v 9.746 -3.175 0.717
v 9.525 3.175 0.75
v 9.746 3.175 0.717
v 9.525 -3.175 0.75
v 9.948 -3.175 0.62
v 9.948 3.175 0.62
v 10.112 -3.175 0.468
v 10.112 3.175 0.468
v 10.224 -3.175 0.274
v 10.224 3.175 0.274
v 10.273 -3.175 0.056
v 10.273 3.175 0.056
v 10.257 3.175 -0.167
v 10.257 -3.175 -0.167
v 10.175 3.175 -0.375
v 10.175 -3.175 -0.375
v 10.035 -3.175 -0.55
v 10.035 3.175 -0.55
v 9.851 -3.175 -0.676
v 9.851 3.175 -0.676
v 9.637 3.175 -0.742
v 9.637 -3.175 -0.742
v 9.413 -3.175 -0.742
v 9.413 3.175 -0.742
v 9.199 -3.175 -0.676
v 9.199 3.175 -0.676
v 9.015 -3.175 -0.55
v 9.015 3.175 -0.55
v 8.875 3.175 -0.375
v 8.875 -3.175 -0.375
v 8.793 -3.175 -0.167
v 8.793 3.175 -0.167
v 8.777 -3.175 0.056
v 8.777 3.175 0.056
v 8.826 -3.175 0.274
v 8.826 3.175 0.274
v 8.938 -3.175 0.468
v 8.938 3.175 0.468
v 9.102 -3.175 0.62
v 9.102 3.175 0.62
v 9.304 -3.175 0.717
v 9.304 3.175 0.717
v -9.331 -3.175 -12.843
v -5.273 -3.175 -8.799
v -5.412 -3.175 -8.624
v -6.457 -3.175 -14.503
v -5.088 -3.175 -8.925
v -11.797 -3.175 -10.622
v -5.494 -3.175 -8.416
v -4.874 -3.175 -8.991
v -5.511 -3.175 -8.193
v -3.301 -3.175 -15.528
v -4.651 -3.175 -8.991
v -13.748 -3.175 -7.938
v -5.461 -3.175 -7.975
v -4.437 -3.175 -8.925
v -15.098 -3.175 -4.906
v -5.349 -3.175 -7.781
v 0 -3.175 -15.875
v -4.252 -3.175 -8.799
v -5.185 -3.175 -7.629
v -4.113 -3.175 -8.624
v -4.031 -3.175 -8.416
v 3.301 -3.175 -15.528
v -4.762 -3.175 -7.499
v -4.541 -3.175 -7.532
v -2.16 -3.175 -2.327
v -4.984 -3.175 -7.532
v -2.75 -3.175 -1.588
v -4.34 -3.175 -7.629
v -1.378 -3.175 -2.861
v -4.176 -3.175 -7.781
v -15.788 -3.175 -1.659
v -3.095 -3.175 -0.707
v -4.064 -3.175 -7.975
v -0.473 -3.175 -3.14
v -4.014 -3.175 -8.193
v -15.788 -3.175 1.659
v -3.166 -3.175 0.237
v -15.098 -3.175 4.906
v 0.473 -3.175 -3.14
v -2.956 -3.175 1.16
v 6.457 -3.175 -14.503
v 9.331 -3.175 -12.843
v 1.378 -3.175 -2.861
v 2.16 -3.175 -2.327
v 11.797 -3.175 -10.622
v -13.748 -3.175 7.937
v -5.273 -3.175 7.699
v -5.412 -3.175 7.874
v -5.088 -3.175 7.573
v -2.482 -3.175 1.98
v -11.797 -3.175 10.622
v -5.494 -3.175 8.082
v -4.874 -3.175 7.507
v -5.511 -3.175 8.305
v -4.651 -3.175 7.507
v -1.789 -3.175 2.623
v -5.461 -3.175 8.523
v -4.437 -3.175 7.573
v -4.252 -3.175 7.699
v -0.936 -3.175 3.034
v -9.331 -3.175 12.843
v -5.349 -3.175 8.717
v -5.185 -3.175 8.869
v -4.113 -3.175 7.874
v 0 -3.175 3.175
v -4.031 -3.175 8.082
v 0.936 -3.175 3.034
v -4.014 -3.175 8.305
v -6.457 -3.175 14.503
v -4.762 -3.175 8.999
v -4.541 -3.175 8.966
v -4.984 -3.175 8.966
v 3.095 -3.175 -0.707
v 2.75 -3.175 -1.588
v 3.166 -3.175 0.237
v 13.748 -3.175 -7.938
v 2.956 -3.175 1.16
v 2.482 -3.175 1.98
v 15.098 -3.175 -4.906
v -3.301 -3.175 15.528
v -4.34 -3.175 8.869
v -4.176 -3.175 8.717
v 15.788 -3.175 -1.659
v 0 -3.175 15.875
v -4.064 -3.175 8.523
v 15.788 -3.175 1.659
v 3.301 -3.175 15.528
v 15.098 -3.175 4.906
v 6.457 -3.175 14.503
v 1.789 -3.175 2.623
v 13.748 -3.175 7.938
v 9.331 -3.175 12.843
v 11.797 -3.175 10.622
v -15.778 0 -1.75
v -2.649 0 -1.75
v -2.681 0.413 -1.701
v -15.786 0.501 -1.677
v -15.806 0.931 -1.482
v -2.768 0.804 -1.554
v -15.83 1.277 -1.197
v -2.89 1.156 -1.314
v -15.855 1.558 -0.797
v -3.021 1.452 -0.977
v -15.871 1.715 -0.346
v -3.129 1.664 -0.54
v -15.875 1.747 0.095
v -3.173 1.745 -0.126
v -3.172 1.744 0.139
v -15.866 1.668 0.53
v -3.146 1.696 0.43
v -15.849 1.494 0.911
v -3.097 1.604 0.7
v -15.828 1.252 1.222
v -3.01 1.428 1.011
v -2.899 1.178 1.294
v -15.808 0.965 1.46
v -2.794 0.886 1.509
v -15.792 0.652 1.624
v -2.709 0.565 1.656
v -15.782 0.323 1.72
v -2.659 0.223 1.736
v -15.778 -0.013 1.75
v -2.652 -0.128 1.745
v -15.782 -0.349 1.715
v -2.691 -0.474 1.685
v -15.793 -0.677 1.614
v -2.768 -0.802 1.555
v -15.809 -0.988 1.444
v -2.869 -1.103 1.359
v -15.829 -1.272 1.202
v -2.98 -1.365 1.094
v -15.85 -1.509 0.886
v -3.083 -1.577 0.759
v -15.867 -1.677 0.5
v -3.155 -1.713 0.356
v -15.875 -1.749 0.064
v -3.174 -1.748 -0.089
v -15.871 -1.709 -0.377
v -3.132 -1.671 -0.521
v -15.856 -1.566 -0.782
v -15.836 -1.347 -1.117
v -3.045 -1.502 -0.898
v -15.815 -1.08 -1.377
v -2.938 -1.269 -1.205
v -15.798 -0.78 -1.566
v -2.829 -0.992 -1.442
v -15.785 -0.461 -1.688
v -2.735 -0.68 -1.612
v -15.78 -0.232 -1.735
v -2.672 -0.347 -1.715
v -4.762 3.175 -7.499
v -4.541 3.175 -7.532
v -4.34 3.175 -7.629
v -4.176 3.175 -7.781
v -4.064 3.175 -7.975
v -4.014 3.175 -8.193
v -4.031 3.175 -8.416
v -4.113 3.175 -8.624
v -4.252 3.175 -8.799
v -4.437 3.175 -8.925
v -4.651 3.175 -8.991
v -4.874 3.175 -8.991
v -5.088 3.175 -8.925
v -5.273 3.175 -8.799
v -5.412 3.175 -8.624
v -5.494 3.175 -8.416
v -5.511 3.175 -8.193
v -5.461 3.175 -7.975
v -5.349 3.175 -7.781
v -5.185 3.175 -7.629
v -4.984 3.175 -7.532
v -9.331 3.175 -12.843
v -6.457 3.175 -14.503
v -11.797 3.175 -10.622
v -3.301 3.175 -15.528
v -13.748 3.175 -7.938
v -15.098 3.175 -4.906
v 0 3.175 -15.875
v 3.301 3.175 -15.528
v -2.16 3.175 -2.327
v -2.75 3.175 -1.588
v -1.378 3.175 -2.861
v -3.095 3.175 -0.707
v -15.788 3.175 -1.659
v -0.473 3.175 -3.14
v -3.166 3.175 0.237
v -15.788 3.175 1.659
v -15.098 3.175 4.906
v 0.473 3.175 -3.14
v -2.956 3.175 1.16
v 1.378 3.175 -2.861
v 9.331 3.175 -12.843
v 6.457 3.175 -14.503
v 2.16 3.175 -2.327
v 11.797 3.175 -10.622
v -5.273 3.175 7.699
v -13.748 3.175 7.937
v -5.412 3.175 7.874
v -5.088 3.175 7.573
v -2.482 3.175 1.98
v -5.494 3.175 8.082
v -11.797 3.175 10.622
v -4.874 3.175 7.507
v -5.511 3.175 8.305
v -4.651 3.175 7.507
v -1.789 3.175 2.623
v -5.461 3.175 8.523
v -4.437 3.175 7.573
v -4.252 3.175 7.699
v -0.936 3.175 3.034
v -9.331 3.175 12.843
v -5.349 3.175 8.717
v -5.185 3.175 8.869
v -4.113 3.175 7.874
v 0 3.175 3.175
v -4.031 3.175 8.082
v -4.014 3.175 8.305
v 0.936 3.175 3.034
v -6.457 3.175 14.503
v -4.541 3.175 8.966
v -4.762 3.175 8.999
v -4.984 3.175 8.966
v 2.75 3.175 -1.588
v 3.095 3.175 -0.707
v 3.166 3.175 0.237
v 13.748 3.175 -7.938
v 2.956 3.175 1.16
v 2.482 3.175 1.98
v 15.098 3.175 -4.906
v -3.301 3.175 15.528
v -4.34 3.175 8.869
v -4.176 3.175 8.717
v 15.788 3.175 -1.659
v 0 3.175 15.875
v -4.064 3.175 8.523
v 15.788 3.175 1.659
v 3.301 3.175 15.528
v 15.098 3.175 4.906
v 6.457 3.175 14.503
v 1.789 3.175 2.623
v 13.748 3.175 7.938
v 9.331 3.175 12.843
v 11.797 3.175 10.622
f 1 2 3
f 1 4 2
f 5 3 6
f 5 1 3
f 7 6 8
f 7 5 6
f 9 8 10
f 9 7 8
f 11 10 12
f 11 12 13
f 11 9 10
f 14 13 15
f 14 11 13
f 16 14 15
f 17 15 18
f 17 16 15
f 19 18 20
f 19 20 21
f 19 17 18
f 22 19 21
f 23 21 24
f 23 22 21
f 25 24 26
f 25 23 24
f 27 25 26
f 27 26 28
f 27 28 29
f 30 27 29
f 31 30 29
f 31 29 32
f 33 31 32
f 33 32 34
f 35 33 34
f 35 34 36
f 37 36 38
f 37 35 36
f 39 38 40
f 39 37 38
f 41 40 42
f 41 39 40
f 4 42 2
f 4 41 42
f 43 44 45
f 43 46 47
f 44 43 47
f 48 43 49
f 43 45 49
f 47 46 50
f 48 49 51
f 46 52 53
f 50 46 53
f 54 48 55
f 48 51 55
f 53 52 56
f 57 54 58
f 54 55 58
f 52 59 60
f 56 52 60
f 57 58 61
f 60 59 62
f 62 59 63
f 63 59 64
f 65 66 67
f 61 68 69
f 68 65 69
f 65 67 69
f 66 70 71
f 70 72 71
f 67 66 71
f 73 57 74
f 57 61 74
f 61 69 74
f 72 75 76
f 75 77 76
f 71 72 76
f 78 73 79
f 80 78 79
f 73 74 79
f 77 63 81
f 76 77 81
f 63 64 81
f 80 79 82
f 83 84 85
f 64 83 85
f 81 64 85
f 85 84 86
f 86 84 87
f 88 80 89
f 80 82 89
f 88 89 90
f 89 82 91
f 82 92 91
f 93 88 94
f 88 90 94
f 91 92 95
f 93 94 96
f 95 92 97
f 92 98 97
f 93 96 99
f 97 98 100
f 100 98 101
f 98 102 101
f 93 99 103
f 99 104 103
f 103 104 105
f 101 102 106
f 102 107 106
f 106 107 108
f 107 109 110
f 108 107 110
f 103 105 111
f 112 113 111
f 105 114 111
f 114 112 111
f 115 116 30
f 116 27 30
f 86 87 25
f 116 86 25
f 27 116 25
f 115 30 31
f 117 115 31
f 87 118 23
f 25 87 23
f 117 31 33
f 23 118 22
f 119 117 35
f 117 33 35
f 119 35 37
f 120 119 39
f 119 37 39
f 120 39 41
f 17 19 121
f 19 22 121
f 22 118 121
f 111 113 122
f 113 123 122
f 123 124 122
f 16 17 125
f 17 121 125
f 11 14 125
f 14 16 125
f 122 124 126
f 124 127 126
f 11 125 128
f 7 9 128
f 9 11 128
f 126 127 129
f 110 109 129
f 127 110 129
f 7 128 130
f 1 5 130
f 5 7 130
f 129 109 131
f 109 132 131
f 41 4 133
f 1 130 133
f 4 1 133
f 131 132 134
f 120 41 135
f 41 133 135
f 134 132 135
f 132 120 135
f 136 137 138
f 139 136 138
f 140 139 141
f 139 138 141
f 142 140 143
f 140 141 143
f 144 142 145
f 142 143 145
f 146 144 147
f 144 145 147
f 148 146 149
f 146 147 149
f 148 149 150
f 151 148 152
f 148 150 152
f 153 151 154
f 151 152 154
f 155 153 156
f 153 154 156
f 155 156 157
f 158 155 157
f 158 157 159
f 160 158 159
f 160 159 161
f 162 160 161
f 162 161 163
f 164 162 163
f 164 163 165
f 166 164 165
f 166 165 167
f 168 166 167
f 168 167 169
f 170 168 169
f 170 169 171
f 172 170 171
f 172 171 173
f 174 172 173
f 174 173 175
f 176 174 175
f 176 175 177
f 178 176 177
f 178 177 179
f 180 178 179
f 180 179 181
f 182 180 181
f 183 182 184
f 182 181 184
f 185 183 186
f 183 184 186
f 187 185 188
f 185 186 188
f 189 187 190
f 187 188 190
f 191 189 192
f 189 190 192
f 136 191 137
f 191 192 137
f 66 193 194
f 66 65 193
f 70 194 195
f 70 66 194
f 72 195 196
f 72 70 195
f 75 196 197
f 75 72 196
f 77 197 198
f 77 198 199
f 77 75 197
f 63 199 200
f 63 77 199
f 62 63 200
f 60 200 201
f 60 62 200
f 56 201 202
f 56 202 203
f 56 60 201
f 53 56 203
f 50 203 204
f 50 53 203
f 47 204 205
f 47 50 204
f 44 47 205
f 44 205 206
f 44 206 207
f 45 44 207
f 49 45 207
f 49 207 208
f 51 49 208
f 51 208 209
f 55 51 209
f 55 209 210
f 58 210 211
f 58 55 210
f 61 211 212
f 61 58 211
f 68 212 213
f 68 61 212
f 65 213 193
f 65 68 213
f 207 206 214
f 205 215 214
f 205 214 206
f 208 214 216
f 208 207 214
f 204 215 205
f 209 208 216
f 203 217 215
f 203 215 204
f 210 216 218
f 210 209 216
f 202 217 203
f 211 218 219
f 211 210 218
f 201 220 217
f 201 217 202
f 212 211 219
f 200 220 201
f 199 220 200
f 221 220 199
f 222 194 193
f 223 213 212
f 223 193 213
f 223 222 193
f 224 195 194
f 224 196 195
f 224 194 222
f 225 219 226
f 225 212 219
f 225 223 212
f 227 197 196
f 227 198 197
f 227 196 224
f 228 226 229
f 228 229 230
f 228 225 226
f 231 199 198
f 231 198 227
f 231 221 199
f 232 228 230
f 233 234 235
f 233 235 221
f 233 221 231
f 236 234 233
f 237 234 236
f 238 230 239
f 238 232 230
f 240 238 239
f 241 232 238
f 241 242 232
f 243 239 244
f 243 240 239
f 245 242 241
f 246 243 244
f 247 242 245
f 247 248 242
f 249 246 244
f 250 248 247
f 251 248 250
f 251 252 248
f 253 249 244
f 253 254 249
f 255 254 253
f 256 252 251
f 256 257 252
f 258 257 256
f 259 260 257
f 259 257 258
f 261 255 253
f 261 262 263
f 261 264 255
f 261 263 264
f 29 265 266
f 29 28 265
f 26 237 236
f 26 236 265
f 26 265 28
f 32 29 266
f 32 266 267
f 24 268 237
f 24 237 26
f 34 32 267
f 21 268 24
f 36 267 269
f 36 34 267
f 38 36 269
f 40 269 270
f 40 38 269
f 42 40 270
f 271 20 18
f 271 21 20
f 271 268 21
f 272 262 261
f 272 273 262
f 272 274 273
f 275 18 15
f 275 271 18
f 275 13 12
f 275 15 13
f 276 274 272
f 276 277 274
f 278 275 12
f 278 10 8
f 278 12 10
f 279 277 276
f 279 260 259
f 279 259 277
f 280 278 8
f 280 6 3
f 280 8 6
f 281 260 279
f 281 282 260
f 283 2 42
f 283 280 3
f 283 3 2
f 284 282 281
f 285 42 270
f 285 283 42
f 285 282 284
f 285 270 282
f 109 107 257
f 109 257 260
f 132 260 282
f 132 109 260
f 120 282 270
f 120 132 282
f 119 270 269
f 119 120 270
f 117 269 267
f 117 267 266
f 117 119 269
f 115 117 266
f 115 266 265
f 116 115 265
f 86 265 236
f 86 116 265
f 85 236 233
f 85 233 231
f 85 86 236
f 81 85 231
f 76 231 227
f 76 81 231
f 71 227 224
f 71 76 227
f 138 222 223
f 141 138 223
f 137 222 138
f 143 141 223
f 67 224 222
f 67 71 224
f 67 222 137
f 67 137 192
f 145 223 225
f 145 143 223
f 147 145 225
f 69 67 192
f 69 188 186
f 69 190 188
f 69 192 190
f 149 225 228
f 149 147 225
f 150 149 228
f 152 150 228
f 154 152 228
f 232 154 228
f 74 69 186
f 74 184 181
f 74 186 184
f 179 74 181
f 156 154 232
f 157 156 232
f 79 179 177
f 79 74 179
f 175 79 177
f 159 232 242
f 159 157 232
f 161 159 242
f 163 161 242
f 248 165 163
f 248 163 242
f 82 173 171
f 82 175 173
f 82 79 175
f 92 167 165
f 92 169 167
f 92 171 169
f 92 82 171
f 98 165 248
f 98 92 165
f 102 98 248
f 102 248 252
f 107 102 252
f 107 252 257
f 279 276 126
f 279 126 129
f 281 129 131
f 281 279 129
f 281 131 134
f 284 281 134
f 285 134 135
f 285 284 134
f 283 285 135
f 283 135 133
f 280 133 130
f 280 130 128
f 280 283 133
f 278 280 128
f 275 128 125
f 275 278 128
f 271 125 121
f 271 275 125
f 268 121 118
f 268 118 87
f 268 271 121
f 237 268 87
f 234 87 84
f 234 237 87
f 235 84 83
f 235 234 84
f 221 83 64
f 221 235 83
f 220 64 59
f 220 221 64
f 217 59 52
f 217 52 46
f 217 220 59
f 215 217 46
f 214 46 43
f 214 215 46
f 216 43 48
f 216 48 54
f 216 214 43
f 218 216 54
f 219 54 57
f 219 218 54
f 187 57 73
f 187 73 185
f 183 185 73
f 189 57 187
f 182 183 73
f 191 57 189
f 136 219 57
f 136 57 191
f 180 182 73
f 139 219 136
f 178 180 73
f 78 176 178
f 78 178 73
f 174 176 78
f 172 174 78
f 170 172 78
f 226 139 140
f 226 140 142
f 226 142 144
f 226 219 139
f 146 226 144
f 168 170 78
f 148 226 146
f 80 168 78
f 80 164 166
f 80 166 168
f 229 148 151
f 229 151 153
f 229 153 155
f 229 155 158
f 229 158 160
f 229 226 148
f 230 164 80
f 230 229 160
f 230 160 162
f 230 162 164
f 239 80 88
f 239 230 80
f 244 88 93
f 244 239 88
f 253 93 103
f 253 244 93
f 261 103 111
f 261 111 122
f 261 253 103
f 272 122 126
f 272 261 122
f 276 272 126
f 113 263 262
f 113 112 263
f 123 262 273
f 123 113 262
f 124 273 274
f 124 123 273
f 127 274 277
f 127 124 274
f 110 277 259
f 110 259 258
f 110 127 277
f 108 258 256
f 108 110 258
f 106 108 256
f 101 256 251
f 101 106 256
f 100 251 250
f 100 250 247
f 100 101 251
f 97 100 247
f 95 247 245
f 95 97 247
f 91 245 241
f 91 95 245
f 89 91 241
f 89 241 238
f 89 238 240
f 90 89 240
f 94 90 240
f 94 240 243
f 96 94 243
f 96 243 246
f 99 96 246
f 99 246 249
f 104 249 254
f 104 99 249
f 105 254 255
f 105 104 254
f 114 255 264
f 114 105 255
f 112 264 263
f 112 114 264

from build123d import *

# Parameters (mm, degrees)
SKETCH1_R           = 15.875
SKETCH1_R_2         = 3.175
SKETCH1_R_3         = 0.750387242
BOSS_EXTRUDE2_DEPTH = 3.175
SKETCH3_R           = 1.750000056
CUT_EXTRUDE1_DEPTH  = 23.674035261


with BuildPart() as part:
    # Sketch1 → Boss-Extrude2 (new, symmetric)
    with BuildSketch(Plane(origin=(0, 0, 0), x_dir=(1, 0, 0), z_dir=(0, 1, 0))):
        with Locations(Location((0, 0, 0), (0, 0, 270))):
            Circle(SKETCH1_R)
        with Locations(Location((0, 0, 0), (0, 0, 270))):
            Circle(SKETCH1_R_2, mode=Mode.SUBTRACT)
        with Locations(Location((9.525, 0, 0), (0, 0, 270))):
            Circle(SKETCH1_R_3, mode=Mode.SUBTRACT)
        with Locations(Location((-4.7625, -8.248891971, 0), (0, 0, 270))):
            Circle(SKETCH1_R_3, mode=Mode.SUBTRACT)
        with Locations(Location((-4.7625, 8.248891971, 0), (0, 0, 270))):
            Circle(SKETCH1_R_3, mode=Mode.SUBTRACT)
    extrude(amount=BOSS_EXTRUDE2_DEPTH, both=True)

    # Sketch3 → Cut-Extrude1 (cut, through all)
    with BuildSketch(Plane(origin=(0, 0, 0), x_dir=(0, 0, -1), z_dir=(1, 0, 0))):
        Circle(SKETCH3_R)
    extrude(amount=-CUT_EXTRUDE1_DEPTH, mode=Mode.SUBTRACT)


solid = part.part
